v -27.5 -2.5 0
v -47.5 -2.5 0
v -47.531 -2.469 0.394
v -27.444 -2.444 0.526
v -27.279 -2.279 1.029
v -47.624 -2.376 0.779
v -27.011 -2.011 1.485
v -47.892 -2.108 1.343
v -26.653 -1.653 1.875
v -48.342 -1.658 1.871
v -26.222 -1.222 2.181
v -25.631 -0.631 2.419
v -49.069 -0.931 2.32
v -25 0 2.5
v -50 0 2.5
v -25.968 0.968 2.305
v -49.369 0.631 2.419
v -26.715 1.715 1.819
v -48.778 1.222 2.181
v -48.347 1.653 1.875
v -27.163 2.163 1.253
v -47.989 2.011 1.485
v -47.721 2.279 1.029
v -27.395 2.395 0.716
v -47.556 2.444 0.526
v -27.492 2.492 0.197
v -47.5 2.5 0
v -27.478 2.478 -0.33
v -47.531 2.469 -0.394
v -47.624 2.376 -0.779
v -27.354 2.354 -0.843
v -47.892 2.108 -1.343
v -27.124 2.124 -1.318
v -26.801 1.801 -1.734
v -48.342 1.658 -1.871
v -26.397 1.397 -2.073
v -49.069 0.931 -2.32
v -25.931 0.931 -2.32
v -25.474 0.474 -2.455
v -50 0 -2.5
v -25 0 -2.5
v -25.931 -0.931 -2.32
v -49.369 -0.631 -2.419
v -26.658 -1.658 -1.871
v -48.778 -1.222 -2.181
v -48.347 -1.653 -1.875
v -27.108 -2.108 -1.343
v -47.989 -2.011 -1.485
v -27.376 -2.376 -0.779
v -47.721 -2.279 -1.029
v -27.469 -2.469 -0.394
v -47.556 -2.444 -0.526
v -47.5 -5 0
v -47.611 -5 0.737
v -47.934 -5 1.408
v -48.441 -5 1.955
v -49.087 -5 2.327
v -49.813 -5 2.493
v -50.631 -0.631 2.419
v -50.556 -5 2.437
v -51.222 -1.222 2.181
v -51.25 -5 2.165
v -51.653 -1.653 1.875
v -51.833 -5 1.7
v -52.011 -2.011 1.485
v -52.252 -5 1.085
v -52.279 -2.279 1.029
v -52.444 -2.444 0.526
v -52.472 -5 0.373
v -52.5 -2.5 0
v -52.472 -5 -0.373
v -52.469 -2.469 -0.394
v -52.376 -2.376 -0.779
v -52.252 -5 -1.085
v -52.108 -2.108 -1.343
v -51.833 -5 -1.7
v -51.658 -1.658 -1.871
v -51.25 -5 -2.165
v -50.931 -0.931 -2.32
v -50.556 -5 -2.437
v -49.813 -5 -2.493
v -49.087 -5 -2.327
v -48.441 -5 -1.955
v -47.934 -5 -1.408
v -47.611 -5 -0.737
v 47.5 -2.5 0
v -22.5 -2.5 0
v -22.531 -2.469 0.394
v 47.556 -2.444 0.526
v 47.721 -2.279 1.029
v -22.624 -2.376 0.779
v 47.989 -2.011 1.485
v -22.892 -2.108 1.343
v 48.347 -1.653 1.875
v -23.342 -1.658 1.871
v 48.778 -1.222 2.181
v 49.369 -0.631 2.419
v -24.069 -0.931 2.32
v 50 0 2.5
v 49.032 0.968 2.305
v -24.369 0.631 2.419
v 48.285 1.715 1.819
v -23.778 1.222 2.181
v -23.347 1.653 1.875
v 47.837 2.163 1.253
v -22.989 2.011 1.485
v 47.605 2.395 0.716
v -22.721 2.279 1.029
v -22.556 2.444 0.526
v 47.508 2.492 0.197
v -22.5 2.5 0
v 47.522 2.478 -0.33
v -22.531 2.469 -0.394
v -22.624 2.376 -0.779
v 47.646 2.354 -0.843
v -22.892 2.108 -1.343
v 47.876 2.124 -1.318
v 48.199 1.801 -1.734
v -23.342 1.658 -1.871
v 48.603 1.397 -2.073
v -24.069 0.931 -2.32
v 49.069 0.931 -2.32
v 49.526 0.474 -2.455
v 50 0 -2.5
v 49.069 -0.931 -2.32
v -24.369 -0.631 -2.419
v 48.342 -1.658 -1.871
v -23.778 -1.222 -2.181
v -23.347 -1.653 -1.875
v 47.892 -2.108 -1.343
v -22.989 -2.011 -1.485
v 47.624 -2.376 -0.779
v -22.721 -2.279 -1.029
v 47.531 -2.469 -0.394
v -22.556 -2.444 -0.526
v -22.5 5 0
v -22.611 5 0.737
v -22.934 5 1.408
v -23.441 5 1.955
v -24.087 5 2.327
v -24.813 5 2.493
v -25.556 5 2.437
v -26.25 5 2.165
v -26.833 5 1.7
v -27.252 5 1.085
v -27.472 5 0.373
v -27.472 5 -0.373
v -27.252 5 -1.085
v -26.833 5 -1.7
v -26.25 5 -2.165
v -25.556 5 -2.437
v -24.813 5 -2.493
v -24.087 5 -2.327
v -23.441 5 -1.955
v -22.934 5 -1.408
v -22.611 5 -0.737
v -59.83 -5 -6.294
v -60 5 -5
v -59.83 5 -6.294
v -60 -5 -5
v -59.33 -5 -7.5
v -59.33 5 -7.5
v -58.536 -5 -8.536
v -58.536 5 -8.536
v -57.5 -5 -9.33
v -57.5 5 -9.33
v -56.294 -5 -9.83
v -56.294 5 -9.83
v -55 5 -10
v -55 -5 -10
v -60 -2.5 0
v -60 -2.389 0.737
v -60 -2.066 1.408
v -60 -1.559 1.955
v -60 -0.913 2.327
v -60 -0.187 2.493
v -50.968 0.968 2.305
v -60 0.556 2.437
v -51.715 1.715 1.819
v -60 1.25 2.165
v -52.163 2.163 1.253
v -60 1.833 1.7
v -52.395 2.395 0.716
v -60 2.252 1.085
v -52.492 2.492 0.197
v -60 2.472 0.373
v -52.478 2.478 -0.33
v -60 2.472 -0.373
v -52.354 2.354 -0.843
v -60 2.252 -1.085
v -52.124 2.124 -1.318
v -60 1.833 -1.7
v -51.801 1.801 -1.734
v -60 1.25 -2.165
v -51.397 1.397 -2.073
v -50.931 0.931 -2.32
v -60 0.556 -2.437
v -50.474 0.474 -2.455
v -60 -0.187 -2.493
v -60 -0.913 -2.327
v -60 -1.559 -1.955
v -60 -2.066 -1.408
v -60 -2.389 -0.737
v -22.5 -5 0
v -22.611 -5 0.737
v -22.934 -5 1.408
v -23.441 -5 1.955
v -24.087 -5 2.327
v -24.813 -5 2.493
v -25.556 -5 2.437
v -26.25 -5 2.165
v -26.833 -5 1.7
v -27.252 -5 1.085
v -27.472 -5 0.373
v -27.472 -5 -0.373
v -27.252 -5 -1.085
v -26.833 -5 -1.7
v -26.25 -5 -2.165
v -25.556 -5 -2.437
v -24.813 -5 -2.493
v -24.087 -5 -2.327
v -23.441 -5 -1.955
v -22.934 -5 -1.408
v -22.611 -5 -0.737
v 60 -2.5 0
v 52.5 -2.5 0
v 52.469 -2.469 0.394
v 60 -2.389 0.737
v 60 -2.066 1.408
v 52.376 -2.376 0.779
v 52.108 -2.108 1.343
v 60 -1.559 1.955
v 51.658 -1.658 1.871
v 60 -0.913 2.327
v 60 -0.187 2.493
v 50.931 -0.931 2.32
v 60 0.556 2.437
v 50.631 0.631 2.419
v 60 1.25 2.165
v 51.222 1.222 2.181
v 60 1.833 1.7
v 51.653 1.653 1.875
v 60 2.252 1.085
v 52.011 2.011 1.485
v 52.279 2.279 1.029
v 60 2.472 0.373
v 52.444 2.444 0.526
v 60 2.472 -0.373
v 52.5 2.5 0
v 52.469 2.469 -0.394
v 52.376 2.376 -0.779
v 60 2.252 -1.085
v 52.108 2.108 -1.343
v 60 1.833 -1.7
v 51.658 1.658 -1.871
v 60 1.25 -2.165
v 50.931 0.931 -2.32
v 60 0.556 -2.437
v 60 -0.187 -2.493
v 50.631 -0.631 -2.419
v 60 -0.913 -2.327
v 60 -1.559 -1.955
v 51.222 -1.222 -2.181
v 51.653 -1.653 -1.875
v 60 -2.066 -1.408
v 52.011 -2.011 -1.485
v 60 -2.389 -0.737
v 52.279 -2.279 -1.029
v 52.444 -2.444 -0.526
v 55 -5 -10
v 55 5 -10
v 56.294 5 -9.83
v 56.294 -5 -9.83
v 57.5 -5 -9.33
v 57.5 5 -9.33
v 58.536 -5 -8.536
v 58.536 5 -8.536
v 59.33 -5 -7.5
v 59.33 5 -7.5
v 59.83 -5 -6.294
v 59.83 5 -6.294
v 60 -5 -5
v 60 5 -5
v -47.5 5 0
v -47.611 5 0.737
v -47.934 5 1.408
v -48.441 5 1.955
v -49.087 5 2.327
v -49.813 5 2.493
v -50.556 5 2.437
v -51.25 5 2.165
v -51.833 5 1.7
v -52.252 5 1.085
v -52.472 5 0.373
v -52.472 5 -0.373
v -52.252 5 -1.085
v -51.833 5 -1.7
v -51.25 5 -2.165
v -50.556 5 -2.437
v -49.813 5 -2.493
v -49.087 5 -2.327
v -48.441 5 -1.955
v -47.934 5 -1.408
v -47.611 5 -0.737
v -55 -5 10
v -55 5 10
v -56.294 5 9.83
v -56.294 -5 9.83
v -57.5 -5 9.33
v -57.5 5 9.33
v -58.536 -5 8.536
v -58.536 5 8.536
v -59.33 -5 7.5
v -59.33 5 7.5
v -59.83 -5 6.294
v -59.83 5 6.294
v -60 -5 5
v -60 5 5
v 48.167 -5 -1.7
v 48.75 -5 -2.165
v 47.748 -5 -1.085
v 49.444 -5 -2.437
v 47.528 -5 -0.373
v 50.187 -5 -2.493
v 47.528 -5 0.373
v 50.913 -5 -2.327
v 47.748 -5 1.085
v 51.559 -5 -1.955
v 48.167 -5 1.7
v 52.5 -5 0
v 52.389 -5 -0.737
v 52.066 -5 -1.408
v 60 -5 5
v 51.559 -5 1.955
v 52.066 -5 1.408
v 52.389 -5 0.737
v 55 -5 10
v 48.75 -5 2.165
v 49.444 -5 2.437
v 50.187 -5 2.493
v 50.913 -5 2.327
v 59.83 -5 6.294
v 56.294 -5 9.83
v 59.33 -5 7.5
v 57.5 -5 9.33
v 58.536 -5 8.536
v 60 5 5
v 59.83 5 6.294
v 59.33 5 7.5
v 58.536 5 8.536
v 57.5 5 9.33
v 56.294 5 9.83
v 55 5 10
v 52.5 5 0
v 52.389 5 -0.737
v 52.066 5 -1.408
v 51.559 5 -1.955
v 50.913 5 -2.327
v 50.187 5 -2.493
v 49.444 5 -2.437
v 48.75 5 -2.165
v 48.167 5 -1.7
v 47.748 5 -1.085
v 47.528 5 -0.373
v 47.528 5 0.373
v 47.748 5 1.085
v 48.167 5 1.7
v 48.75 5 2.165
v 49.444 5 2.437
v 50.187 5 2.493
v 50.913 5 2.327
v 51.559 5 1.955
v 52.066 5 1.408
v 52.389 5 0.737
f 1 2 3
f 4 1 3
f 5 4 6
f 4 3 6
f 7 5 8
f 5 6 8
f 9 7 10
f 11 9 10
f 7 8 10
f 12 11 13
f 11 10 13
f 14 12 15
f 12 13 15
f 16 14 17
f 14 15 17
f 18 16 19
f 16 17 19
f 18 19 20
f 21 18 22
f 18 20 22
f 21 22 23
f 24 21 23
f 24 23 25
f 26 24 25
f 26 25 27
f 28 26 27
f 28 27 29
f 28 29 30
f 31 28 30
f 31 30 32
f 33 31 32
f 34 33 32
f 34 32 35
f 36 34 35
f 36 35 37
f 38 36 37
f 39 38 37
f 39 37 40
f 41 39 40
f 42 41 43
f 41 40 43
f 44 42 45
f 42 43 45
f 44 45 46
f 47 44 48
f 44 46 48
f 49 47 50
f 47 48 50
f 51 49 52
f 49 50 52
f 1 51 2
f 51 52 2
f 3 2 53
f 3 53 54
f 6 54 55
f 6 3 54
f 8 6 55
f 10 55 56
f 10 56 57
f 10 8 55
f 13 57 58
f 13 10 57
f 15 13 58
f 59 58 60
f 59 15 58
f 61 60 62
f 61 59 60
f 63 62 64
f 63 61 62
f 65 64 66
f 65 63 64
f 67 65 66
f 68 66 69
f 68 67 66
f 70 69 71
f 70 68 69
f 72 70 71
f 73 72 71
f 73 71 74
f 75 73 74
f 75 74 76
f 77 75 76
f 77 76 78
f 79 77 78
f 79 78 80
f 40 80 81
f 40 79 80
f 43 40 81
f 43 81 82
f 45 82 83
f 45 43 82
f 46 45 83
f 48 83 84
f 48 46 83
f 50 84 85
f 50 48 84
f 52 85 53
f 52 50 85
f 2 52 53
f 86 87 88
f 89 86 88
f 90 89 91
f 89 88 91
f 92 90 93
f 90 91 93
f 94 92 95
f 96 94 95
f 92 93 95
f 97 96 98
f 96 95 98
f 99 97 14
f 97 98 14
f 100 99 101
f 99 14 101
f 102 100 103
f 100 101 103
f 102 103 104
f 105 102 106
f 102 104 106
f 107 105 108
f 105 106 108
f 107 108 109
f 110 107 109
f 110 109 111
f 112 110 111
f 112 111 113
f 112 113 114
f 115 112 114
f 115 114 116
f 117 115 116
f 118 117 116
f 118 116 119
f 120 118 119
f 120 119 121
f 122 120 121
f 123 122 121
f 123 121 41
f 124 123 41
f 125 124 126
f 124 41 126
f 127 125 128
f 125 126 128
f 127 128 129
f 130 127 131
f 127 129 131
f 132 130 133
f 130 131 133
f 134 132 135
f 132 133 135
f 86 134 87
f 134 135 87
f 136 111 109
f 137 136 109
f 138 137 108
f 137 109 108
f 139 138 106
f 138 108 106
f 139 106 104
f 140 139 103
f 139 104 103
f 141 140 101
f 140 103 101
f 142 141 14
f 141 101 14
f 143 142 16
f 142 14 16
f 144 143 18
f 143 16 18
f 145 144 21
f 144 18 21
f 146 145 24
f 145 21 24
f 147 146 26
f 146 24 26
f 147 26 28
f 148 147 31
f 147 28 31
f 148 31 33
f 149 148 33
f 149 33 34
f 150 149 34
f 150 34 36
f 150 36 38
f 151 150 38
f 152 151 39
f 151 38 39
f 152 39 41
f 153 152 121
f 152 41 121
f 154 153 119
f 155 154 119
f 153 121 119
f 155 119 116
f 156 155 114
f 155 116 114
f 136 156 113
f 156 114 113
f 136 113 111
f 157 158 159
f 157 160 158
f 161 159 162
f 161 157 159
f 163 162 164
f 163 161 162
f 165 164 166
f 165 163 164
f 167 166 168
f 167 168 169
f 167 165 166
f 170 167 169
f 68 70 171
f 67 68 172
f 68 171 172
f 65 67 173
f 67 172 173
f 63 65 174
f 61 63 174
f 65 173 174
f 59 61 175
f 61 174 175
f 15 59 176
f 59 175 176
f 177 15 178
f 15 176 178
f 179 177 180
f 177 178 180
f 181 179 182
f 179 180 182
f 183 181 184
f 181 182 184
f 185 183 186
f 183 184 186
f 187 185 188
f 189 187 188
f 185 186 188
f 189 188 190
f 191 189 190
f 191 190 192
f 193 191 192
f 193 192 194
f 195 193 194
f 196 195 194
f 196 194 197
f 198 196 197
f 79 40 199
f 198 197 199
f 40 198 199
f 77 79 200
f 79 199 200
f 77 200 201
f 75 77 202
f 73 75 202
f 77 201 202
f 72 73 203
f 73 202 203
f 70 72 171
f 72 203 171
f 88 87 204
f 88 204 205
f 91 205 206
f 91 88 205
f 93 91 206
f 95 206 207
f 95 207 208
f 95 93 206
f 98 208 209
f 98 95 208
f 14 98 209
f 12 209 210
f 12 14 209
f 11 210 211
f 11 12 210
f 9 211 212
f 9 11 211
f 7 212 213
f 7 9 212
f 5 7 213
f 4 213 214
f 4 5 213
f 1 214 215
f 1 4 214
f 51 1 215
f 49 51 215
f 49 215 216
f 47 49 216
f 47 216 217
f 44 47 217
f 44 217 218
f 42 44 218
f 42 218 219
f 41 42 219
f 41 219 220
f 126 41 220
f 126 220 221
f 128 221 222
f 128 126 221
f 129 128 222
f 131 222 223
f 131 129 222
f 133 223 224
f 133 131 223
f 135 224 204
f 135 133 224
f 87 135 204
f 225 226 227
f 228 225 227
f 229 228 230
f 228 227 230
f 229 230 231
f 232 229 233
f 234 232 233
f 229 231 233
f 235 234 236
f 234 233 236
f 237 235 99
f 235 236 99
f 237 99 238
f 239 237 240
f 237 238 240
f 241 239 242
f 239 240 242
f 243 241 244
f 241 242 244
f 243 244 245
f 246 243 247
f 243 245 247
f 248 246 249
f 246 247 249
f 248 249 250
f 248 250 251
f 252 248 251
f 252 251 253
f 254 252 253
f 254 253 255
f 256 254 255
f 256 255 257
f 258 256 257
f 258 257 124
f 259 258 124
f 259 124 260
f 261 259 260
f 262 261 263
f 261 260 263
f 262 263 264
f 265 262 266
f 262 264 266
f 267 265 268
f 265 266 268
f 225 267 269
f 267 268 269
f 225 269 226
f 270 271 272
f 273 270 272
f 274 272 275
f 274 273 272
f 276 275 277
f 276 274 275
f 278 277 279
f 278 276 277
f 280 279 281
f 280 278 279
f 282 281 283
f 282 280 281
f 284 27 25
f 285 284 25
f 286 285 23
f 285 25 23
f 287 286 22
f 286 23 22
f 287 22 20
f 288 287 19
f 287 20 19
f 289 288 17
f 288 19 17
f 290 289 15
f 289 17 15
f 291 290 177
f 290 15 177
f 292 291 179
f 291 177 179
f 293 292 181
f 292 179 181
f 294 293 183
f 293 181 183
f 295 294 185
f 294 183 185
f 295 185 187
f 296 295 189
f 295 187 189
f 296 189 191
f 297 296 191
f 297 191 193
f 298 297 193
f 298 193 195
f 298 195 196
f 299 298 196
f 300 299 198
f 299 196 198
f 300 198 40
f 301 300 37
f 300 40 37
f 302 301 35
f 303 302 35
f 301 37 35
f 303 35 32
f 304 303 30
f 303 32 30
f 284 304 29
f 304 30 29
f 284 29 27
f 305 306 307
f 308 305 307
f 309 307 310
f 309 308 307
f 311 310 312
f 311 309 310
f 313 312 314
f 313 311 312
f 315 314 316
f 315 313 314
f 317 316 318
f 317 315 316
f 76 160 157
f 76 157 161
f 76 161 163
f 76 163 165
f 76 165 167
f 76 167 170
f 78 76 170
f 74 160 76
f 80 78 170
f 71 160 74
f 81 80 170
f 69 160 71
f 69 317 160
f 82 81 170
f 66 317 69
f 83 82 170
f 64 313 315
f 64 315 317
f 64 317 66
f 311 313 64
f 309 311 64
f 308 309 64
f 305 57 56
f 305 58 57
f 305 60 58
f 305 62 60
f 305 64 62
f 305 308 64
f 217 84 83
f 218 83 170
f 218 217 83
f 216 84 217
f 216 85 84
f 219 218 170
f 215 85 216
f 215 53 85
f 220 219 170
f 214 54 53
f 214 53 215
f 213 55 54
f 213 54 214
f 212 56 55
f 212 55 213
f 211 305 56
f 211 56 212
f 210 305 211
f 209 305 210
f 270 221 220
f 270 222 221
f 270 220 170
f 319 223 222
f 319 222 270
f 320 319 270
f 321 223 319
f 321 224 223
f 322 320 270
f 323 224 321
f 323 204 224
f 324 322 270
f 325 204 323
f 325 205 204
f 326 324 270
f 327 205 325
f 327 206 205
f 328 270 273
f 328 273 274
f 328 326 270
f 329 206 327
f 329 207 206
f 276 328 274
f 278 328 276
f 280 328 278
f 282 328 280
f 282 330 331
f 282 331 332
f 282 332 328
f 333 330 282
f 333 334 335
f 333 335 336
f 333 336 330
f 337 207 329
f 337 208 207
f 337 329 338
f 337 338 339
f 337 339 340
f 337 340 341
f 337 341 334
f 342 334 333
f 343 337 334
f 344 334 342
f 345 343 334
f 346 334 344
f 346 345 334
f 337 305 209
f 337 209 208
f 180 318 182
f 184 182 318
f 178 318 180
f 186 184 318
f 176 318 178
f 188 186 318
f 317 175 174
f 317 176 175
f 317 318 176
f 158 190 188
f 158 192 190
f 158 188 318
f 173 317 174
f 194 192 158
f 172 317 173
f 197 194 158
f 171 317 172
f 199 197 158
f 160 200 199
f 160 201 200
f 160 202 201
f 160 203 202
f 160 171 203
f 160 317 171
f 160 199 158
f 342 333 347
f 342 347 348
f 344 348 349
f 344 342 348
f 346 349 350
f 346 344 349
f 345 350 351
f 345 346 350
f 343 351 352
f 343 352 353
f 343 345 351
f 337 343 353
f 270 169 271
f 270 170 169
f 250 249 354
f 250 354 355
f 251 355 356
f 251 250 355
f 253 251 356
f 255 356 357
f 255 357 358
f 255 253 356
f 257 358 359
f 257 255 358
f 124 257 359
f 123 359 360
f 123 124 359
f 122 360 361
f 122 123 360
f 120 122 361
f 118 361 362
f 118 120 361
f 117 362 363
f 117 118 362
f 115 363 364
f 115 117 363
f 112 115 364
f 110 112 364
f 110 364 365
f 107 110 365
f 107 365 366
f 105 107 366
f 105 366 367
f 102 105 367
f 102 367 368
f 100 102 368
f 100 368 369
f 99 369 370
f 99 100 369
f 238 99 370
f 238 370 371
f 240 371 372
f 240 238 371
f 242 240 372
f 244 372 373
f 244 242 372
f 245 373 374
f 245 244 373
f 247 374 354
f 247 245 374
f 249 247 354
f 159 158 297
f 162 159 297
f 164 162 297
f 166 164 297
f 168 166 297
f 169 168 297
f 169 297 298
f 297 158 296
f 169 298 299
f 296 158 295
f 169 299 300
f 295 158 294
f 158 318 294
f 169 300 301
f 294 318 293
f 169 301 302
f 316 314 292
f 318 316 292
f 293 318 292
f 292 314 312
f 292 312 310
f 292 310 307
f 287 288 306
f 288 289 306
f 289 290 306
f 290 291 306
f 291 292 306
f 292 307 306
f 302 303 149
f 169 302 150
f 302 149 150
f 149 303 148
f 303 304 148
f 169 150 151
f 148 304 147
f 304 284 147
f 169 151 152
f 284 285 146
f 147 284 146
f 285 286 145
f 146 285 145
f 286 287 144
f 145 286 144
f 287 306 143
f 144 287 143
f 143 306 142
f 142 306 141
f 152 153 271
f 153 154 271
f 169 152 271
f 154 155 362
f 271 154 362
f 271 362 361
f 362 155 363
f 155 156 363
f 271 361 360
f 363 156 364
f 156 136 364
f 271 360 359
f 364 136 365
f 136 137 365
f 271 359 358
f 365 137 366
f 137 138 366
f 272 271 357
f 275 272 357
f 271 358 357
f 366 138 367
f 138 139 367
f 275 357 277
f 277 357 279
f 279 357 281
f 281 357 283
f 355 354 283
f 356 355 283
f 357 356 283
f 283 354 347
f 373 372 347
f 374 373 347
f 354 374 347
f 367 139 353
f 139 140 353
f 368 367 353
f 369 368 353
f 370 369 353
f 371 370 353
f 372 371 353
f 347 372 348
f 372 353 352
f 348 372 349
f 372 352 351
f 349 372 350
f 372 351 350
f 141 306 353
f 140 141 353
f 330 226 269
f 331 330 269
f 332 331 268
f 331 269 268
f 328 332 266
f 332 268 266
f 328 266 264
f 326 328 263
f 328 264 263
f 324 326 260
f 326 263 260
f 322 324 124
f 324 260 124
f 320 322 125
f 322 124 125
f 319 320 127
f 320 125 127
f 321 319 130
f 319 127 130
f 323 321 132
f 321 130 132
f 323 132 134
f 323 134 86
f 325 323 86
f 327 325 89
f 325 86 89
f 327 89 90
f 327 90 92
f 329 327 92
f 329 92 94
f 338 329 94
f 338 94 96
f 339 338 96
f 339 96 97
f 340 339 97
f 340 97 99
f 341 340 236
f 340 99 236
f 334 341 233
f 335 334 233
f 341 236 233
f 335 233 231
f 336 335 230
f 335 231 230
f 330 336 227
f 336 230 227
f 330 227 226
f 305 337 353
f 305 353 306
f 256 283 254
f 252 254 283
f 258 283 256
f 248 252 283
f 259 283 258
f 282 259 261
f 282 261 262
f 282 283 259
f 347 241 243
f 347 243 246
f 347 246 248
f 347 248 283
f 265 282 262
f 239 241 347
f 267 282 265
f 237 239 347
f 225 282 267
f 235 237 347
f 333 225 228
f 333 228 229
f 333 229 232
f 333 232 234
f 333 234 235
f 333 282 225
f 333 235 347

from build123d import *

# Parameters (mm, degrees)
F0_R     = 2.5
F1_DEPTH = 5
F2_R     = 2.5
F3_DEPTH = 120


with BuildPart() as f1:
    # F0 (on Front) → F1 (new body, symmetric)
    with BuildSketch(Plane.XZ):
        with BuildLine():
            Line((-55, -10), (55, -10))
            ThreePointArc((55, -10), (58.535534, -8.535534), (60, -5))
            Line((60, -5), (60, 5))
            ThreePointArc((60, 5), (58.535534, 8.535534), (55, 10))
            Line((55, 10), (-55, 10))
            ThreePointArc((-55, 10), (-58.535534, 8.535534), (-60, 5))
            Line((-60, 5), (-60, -5))
            ThreePointArc((-60, -5), (-58.535534, -8.535534), (-55, -10))
        make_face()
        with Locations((-50, 0)):
            Circle(F0_R, mode=Mode.SUBTRACT)
        with Locations((-25, 0)):
            Circle(F0_R, mode=Mode.SUBTRACT)
        with BuildLine():
            ThreePointArc((47.5, 0), (50, 2.5), (52.5, 0))
            ThreePointArc((52.5, 0), (50, -2.5), (47.5, 0))
        make_face(mode=Mode.SUBTRACT)
    extrude(amount=F1_DEPTH, both=True)

    # F2 (on face) → F3 (cut)
    with BuildSketch(Plane(origin=(-60, 0, 0), x_dir=(0, -1, 0), z_dir=(-1, 0, 0))):
        Circle(F2_R)
    extrude(amount=-F3_DEPTH, mode=Mode.SUBTRACT)


solid = f1.part
